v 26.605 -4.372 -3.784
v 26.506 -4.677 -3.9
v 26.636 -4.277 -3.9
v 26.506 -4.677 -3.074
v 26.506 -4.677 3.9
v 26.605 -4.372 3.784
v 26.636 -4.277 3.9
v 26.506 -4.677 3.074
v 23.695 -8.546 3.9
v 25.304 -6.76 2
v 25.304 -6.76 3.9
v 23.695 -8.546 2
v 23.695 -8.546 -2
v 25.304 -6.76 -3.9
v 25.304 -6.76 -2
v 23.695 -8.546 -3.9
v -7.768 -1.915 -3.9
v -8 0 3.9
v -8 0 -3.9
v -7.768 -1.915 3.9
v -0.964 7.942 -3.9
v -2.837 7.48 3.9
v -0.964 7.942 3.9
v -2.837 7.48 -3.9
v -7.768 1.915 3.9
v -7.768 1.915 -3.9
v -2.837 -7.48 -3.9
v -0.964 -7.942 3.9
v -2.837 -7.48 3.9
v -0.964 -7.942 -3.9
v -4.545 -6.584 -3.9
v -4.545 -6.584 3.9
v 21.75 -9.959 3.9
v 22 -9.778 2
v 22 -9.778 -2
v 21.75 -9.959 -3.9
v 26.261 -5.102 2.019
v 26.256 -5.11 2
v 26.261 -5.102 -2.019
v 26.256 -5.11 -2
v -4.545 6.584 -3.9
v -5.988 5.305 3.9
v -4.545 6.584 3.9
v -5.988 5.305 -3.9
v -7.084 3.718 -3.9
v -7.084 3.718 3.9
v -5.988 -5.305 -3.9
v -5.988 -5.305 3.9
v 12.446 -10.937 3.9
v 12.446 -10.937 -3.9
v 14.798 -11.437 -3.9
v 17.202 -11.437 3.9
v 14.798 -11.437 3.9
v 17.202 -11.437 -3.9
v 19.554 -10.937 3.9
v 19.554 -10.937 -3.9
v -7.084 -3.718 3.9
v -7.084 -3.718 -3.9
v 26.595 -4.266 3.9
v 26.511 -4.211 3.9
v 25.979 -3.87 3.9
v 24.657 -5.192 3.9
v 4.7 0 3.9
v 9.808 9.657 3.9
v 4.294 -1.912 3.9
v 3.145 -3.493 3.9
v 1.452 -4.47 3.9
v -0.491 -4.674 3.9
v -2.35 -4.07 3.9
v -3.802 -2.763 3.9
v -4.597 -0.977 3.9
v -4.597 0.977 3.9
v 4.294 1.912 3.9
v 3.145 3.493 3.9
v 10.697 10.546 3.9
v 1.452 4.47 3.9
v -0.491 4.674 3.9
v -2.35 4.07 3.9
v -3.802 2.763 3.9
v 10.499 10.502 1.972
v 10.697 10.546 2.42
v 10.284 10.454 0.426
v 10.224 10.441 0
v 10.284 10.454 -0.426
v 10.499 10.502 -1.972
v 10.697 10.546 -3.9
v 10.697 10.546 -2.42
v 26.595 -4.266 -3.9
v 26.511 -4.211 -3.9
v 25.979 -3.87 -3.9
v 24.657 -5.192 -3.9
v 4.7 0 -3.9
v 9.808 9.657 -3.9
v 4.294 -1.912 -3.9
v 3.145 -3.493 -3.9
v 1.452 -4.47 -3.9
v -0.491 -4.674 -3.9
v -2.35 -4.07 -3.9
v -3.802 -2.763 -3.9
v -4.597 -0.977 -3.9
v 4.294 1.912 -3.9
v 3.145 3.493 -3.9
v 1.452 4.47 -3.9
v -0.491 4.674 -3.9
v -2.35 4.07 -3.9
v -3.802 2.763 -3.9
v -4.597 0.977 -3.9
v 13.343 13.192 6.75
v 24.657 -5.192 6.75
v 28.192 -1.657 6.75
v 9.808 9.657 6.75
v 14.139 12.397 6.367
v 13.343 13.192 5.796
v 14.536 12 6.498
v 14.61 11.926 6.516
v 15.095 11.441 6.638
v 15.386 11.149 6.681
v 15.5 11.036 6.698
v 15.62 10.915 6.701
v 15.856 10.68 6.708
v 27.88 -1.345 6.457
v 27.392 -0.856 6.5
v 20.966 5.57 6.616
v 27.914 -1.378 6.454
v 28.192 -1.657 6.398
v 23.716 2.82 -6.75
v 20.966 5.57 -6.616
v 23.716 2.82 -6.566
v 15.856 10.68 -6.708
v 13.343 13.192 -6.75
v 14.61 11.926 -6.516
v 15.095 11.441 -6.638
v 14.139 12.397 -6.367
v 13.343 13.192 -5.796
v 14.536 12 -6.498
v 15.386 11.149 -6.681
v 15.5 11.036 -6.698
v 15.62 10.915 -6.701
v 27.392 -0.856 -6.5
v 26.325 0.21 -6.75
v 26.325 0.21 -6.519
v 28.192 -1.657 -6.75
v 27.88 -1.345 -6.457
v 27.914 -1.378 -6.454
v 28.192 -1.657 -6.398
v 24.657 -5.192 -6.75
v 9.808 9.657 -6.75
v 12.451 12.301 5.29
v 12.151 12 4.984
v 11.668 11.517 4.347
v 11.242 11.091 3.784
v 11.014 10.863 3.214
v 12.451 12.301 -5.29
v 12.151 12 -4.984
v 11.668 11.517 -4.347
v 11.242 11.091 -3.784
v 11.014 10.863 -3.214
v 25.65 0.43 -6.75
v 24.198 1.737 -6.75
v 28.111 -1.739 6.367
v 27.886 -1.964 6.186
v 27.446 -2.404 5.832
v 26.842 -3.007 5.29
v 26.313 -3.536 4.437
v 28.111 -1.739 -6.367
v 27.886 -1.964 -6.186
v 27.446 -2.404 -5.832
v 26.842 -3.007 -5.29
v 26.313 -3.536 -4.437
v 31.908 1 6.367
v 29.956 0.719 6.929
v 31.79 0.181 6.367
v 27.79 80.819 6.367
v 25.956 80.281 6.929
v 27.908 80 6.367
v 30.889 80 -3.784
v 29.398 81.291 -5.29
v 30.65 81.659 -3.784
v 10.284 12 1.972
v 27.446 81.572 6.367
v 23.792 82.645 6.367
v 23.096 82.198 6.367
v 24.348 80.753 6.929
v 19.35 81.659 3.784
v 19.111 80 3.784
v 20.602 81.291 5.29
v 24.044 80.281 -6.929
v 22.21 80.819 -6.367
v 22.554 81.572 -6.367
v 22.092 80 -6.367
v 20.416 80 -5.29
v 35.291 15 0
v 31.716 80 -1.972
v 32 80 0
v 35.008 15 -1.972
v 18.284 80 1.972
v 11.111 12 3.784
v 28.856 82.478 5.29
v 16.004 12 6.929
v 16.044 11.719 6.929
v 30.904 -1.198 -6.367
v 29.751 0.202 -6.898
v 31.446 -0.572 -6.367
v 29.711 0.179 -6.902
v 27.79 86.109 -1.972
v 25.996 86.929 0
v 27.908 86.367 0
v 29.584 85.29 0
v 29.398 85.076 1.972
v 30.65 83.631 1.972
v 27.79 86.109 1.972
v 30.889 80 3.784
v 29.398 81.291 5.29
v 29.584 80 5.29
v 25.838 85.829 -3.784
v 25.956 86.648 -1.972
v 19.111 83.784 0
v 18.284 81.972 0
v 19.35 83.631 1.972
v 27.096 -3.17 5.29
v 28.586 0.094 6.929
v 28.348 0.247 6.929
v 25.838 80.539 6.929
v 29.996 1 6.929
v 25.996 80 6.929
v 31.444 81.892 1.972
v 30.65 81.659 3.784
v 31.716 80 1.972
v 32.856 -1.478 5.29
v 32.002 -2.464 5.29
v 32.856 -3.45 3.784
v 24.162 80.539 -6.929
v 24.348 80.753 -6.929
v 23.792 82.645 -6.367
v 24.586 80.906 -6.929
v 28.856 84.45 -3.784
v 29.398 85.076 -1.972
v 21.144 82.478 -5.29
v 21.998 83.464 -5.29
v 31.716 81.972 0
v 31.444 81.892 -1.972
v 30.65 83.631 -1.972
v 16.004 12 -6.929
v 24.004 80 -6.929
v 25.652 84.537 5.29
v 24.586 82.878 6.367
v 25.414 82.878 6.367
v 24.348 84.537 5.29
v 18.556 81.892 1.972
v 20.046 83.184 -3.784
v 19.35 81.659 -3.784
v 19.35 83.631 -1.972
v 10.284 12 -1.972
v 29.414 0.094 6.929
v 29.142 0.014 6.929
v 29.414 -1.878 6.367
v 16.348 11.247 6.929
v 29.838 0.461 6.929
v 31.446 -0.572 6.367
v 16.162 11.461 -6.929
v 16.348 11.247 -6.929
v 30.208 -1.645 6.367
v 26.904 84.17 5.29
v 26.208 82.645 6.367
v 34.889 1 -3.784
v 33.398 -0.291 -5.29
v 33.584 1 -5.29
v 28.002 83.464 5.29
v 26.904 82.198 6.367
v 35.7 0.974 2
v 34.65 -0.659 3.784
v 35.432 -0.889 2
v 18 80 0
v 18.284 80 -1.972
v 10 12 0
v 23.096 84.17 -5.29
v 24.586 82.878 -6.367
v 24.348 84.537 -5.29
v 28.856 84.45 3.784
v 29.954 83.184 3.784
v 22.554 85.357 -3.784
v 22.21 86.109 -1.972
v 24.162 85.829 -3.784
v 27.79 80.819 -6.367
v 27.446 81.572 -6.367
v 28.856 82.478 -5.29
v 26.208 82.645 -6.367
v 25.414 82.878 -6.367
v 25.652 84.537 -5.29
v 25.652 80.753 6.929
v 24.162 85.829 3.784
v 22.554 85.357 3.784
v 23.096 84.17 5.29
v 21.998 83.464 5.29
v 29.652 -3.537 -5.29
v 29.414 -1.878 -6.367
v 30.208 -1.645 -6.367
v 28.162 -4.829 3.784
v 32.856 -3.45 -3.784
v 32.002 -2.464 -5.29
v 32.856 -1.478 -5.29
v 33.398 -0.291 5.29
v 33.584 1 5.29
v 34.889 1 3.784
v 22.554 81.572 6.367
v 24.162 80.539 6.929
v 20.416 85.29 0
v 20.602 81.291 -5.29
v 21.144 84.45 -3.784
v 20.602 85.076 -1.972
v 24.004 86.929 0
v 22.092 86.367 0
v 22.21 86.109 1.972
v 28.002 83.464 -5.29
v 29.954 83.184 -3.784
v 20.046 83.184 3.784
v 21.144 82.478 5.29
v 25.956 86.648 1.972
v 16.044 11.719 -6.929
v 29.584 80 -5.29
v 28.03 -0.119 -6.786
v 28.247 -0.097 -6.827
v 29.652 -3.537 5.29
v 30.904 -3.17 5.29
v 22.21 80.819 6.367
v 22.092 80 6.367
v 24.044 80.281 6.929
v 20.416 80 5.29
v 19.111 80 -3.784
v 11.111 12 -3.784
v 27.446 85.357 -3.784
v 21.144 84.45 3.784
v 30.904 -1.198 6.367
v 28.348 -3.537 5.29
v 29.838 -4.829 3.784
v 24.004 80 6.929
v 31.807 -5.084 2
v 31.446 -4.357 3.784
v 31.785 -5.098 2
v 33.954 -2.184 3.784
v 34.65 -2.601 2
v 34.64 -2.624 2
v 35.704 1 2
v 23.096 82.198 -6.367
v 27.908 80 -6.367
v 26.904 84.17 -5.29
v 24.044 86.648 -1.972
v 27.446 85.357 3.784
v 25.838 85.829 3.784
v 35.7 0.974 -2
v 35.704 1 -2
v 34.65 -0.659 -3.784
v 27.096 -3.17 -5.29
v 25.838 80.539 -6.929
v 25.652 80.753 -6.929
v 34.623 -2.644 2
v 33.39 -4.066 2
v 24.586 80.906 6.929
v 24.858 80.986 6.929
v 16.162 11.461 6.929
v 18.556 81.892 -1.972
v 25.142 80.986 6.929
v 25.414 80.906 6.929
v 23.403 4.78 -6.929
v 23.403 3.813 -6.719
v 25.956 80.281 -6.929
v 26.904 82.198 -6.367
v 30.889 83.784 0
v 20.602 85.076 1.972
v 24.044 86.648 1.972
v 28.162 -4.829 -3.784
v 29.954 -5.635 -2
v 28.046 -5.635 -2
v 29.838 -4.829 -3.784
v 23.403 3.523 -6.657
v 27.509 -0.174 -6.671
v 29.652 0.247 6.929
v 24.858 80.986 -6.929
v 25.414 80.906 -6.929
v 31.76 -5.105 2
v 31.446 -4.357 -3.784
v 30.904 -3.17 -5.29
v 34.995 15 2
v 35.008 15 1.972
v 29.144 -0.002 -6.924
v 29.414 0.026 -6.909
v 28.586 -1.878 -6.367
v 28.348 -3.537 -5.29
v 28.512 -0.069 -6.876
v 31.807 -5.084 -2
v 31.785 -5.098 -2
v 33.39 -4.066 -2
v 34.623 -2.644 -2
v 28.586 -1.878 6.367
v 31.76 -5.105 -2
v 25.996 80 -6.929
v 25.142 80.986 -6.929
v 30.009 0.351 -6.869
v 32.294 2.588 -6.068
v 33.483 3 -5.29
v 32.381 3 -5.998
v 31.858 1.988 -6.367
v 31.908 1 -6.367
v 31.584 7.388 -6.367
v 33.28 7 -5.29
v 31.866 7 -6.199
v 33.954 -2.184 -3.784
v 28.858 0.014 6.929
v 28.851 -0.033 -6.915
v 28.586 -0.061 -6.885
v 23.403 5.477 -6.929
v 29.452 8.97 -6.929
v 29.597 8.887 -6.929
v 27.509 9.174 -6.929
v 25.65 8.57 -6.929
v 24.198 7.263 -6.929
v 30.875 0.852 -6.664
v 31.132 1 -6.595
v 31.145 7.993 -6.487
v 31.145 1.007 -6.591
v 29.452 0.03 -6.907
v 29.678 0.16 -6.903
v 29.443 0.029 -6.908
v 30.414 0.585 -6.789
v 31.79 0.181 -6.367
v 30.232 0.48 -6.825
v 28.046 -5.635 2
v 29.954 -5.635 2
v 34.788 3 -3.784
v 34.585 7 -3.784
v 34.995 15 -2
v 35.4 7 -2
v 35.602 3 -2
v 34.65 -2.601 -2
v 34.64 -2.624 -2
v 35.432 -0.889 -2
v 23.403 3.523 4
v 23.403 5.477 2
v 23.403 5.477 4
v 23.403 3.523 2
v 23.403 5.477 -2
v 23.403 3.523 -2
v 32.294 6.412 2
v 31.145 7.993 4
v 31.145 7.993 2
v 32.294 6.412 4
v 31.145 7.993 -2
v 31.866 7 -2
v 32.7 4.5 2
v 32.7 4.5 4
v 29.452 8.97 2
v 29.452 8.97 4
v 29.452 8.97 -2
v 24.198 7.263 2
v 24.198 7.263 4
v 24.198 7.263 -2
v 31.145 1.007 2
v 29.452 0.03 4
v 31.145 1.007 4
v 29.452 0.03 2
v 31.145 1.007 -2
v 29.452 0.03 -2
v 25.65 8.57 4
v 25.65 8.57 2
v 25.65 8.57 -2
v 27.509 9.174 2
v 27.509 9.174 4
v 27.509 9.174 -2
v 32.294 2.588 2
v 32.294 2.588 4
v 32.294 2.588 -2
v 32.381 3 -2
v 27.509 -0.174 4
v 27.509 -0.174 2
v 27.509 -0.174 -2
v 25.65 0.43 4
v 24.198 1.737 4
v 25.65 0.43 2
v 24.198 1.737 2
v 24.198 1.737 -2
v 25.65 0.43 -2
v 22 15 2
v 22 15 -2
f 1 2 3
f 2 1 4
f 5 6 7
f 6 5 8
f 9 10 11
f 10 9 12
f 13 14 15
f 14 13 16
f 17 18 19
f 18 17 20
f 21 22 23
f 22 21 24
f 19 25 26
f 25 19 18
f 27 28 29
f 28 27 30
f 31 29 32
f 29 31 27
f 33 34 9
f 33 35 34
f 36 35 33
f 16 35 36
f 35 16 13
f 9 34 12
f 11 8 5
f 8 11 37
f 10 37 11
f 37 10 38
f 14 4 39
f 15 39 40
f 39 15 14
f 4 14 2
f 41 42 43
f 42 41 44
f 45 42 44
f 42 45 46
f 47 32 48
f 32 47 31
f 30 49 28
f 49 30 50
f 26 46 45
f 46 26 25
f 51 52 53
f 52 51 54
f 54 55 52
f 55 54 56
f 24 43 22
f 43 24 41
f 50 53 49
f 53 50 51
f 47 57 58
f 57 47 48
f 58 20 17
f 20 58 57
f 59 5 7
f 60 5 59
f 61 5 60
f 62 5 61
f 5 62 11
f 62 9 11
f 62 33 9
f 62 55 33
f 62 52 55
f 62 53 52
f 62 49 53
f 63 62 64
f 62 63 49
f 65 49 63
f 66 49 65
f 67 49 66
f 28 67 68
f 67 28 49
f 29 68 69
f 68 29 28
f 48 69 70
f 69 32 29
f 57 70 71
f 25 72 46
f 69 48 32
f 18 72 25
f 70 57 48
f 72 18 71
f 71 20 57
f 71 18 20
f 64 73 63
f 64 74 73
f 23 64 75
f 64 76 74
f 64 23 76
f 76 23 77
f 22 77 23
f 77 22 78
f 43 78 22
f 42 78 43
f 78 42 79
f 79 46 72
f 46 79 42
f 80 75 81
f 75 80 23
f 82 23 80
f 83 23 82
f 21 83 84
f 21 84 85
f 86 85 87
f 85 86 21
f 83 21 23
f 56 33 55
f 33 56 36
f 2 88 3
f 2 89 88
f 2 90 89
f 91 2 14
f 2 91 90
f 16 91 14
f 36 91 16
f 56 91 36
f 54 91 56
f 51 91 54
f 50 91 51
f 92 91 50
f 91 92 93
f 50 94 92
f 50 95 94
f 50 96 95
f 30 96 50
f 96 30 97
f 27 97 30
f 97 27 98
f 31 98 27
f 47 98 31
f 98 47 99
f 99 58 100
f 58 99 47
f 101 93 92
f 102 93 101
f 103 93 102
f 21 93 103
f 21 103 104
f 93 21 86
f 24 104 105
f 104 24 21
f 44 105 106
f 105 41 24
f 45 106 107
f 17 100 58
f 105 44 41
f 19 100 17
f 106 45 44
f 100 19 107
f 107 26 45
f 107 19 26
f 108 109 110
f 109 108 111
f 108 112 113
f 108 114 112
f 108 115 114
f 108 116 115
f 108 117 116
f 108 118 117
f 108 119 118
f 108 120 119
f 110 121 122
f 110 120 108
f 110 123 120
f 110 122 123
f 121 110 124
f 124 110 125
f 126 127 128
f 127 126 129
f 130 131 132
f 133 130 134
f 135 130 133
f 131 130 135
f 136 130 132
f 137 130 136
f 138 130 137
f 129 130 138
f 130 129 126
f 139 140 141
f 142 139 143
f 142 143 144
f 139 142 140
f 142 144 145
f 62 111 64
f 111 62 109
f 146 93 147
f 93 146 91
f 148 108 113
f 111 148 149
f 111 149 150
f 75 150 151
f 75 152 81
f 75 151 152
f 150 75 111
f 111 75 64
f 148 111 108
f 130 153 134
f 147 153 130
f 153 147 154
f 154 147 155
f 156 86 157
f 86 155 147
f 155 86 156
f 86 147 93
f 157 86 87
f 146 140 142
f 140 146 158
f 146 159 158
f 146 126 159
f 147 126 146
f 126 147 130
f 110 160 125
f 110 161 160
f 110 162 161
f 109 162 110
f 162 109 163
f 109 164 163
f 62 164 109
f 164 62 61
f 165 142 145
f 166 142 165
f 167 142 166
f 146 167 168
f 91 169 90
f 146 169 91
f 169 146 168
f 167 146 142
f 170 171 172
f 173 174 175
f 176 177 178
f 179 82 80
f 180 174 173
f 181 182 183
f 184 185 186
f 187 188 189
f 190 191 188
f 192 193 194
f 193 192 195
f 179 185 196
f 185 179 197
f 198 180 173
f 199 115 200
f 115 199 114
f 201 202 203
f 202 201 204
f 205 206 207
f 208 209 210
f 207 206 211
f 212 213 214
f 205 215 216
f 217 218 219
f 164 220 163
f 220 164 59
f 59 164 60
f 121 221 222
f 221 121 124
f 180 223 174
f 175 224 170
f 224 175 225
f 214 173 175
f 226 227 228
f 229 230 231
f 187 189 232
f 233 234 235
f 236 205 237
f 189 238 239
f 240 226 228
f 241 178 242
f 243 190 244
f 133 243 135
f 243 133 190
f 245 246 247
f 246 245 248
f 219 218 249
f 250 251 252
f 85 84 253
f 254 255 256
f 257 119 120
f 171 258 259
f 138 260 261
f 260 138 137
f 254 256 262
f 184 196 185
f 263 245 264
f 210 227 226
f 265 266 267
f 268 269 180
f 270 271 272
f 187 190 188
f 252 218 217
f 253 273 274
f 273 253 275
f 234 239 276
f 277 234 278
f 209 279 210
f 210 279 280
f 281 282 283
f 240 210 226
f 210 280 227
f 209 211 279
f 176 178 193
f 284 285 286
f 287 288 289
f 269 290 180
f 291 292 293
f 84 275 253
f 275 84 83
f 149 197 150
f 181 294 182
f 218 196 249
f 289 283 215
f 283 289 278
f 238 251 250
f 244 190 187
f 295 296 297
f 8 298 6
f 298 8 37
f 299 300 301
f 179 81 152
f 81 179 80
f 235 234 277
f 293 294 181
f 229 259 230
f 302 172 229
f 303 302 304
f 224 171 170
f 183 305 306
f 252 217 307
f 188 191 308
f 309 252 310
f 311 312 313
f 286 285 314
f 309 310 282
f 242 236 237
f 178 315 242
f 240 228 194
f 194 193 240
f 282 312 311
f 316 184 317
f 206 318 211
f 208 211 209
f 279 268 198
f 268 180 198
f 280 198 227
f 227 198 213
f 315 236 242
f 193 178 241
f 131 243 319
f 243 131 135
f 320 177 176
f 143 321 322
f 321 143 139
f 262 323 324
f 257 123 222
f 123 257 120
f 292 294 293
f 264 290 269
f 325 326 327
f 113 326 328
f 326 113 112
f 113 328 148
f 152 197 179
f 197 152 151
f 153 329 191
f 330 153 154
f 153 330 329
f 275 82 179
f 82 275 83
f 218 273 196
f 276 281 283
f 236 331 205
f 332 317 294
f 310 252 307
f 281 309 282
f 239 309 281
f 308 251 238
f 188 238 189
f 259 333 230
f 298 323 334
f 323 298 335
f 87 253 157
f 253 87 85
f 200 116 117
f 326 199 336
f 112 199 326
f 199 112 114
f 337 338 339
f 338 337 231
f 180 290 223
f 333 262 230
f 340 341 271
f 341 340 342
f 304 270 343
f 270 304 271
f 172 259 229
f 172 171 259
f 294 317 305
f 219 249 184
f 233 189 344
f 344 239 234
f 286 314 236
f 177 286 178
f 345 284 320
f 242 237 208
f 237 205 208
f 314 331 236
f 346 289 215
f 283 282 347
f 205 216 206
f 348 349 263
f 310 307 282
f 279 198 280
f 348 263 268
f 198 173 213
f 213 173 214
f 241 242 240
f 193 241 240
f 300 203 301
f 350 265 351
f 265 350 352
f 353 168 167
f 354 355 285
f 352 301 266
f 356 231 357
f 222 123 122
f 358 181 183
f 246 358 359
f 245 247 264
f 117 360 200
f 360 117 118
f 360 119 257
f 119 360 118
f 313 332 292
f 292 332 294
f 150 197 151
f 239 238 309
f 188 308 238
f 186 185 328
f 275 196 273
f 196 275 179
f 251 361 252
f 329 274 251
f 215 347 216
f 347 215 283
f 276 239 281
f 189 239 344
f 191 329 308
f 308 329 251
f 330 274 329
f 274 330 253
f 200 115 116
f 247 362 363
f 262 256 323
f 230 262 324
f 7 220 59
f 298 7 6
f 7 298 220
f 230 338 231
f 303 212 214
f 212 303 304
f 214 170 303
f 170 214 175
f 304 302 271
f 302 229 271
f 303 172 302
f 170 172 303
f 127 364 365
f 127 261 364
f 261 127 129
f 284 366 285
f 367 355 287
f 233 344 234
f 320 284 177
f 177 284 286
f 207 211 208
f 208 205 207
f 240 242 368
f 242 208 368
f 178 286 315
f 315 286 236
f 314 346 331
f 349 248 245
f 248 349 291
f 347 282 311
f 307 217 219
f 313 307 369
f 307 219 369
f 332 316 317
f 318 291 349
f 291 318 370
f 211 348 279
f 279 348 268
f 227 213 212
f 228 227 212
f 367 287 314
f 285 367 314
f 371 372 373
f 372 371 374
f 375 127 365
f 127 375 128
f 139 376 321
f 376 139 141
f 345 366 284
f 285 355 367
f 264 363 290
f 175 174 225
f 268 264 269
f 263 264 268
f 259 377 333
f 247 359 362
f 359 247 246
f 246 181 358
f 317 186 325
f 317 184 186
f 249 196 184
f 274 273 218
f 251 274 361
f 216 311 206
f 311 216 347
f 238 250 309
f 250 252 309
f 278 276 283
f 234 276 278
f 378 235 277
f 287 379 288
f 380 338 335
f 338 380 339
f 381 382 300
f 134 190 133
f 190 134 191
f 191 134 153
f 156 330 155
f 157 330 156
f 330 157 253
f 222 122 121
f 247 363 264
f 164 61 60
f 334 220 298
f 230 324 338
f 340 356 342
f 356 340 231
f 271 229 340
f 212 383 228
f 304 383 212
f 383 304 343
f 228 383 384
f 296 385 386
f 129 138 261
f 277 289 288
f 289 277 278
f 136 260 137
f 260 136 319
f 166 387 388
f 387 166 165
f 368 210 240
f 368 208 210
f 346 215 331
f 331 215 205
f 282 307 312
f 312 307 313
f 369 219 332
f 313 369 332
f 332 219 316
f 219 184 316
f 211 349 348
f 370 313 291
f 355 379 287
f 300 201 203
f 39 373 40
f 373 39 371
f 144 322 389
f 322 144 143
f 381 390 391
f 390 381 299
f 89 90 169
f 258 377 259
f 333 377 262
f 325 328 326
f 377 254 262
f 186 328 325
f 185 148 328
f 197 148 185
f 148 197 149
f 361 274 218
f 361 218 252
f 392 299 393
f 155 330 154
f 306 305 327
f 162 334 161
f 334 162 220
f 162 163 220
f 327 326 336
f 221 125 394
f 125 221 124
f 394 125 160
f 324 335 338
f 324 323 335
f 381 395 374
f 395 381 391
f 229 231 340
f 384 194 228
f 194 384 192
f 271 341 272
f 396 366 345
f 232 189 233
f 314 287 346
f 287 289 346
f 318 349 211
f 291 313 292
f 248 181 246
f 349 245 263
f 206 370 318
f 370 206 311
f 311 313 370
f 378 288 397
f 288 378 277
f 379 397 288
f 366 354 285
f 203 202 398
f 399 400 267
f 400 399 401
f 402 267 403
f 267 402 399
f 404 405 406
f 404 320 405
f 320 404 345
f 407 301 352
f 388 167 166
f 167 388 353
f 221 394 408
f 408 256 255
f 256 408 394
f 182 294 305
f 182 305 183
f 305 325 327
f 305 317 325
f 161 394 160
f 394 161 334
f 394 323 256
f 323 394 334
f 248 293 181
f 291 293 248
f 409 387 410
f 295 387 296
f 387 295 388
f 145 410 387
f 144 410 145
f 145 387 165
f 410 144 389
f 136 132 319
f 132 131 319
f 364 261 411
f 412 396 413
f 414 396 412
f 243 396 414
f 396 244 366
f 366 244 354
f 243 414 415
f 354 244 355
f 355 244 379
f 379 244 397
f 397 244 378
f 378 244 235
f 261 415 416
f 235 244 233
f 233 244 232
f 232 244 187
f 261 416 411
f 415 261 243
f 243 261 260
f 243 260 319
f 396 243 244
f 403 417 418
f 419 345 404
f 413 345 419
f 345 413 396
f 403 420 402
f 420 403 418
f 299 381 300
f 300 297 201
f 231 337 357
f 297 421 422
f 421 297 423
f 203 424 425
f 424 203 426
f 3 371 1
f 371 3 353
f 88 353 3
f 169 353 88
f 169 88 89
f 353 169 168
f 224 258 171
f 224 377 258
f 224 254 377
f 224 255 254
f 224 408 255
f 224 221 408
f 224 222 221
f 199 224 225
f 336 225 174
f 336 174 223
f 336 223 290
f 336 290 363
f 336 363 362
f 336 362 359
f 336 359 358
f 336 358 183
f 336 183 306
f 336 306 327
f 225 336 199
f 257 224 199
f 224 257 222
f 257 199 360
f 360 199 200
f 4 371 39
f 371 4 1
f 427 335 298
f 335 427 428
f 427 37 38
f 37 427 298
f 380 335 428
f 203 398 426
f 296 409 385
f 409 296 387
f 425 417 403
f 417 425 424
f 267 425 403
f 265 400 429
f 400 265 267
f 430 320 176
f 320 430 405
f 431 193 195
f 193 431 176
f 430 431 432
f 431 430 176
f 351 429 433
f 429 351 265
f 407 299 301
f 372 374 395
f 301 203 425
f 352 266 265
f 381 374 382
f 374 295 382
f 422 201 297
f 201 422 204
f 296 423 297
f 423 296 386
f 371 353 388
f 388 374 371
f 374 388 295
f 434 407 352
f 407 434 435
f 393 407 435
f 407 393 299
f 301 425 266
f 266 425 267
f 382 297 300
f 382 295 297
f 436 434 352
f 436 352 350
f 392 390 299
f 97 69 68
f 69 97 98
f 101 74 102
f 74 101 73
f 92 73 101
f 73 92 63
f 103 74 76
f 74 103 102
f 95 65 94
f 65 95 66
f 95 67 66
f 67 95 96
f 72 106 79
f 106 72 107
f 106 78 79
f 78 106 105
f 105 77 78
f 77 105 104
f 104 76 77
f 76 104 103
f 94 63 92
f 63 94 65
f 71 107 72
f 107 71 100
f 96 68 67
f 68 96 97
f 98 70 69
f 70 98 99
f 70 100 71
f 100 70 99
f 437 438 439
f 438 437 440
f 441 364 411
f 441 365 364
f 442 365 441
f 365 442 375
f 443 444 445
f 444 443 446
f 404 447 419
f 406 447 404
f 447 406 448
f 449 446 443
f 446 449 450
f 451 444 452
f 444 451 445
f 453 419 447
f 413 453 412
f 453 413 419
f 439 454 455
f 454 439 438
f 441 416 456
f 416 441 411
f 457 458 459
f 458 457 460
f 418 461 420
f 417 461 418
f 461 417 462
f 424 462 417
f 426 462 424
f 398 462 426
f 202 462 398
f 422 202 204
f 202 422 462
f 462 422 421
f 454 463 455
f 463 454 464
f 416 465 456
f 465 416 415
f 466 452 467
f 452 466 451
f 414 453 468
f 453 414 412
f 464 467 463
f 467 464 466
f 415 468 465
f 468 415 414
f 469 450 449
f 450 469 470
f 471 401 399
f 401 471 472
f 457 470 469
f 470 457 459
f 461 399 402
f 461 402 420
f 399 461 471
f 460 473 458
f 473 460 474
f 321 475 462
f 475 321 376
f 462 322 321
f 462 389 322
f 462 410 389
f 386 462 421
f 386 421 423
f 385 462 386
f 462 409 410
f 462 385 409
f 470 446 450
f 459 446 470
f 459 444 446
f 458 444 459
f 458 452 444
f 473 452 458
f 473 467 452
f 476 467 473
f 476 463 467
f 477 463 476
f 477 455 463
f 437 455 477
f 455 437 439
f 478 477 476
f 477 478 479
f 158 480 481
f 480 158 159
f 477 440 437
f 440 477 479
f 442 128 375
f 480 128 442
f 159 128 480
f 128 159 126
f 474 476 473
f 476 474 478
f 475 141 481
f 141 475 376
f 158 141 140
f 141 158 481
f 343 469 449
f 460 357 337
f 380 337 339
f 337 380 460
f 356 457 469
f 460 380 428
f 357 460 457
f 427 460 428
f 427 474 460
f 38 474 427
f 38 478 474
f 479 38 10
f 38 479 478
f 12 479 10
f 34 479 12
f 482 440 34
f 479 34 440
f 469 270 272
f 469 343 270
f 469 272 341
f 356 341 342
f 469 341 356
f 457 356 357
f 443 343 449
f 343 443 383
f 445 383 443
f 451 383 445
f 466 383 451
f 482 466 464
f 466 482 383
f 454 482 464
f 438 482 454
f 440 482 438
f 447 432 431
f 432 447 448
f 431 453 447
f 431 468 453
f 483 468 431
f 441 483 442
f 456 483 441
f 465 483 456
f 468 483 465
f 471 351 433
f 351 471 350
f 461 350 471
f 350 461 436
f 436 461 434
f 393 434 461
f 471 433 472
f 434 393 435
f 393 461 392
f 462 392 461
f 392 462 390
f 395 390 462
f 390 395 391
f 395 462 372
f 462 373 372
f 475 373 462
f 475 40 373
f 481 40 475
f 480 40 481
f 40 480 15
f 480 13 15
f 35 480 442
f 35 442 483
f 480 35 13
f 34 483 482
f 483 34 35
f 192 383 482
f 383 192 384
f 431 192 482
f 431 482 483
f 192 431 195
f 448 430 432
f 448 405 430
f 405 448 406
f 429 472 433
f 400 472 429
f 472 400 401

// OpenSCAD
//$fn = 50;

difference() {
union() {
hull() {
cylinder(7.8, 8, 8, true);
translate([16, 0, 0]) cylinder(7.8, 11.5, 11.5, true);
}
translate([19,4,0]) rotate([0, 0, 45]) cube([5, 21, 13.5], true);

hull() {
translate([29,1,0]) sphere(7, true);
translate([17,12,0]) sphere(7, true);
translate([25,80,0]) sphere(7, true);
}

}

cylinder(17.8, 4.7, 4.7, true);
translate([28, 4.5, -6]) cylinder(20, 4.7, 4.7, true);

translate([32, 0 ,0]) cube([20, 30, 4], true);
translate([36, 5 , -15]) cube([20, 4, 30], true);

}


//translate([-15, 47, 0]) cylinder(30, 40, 40, true);
